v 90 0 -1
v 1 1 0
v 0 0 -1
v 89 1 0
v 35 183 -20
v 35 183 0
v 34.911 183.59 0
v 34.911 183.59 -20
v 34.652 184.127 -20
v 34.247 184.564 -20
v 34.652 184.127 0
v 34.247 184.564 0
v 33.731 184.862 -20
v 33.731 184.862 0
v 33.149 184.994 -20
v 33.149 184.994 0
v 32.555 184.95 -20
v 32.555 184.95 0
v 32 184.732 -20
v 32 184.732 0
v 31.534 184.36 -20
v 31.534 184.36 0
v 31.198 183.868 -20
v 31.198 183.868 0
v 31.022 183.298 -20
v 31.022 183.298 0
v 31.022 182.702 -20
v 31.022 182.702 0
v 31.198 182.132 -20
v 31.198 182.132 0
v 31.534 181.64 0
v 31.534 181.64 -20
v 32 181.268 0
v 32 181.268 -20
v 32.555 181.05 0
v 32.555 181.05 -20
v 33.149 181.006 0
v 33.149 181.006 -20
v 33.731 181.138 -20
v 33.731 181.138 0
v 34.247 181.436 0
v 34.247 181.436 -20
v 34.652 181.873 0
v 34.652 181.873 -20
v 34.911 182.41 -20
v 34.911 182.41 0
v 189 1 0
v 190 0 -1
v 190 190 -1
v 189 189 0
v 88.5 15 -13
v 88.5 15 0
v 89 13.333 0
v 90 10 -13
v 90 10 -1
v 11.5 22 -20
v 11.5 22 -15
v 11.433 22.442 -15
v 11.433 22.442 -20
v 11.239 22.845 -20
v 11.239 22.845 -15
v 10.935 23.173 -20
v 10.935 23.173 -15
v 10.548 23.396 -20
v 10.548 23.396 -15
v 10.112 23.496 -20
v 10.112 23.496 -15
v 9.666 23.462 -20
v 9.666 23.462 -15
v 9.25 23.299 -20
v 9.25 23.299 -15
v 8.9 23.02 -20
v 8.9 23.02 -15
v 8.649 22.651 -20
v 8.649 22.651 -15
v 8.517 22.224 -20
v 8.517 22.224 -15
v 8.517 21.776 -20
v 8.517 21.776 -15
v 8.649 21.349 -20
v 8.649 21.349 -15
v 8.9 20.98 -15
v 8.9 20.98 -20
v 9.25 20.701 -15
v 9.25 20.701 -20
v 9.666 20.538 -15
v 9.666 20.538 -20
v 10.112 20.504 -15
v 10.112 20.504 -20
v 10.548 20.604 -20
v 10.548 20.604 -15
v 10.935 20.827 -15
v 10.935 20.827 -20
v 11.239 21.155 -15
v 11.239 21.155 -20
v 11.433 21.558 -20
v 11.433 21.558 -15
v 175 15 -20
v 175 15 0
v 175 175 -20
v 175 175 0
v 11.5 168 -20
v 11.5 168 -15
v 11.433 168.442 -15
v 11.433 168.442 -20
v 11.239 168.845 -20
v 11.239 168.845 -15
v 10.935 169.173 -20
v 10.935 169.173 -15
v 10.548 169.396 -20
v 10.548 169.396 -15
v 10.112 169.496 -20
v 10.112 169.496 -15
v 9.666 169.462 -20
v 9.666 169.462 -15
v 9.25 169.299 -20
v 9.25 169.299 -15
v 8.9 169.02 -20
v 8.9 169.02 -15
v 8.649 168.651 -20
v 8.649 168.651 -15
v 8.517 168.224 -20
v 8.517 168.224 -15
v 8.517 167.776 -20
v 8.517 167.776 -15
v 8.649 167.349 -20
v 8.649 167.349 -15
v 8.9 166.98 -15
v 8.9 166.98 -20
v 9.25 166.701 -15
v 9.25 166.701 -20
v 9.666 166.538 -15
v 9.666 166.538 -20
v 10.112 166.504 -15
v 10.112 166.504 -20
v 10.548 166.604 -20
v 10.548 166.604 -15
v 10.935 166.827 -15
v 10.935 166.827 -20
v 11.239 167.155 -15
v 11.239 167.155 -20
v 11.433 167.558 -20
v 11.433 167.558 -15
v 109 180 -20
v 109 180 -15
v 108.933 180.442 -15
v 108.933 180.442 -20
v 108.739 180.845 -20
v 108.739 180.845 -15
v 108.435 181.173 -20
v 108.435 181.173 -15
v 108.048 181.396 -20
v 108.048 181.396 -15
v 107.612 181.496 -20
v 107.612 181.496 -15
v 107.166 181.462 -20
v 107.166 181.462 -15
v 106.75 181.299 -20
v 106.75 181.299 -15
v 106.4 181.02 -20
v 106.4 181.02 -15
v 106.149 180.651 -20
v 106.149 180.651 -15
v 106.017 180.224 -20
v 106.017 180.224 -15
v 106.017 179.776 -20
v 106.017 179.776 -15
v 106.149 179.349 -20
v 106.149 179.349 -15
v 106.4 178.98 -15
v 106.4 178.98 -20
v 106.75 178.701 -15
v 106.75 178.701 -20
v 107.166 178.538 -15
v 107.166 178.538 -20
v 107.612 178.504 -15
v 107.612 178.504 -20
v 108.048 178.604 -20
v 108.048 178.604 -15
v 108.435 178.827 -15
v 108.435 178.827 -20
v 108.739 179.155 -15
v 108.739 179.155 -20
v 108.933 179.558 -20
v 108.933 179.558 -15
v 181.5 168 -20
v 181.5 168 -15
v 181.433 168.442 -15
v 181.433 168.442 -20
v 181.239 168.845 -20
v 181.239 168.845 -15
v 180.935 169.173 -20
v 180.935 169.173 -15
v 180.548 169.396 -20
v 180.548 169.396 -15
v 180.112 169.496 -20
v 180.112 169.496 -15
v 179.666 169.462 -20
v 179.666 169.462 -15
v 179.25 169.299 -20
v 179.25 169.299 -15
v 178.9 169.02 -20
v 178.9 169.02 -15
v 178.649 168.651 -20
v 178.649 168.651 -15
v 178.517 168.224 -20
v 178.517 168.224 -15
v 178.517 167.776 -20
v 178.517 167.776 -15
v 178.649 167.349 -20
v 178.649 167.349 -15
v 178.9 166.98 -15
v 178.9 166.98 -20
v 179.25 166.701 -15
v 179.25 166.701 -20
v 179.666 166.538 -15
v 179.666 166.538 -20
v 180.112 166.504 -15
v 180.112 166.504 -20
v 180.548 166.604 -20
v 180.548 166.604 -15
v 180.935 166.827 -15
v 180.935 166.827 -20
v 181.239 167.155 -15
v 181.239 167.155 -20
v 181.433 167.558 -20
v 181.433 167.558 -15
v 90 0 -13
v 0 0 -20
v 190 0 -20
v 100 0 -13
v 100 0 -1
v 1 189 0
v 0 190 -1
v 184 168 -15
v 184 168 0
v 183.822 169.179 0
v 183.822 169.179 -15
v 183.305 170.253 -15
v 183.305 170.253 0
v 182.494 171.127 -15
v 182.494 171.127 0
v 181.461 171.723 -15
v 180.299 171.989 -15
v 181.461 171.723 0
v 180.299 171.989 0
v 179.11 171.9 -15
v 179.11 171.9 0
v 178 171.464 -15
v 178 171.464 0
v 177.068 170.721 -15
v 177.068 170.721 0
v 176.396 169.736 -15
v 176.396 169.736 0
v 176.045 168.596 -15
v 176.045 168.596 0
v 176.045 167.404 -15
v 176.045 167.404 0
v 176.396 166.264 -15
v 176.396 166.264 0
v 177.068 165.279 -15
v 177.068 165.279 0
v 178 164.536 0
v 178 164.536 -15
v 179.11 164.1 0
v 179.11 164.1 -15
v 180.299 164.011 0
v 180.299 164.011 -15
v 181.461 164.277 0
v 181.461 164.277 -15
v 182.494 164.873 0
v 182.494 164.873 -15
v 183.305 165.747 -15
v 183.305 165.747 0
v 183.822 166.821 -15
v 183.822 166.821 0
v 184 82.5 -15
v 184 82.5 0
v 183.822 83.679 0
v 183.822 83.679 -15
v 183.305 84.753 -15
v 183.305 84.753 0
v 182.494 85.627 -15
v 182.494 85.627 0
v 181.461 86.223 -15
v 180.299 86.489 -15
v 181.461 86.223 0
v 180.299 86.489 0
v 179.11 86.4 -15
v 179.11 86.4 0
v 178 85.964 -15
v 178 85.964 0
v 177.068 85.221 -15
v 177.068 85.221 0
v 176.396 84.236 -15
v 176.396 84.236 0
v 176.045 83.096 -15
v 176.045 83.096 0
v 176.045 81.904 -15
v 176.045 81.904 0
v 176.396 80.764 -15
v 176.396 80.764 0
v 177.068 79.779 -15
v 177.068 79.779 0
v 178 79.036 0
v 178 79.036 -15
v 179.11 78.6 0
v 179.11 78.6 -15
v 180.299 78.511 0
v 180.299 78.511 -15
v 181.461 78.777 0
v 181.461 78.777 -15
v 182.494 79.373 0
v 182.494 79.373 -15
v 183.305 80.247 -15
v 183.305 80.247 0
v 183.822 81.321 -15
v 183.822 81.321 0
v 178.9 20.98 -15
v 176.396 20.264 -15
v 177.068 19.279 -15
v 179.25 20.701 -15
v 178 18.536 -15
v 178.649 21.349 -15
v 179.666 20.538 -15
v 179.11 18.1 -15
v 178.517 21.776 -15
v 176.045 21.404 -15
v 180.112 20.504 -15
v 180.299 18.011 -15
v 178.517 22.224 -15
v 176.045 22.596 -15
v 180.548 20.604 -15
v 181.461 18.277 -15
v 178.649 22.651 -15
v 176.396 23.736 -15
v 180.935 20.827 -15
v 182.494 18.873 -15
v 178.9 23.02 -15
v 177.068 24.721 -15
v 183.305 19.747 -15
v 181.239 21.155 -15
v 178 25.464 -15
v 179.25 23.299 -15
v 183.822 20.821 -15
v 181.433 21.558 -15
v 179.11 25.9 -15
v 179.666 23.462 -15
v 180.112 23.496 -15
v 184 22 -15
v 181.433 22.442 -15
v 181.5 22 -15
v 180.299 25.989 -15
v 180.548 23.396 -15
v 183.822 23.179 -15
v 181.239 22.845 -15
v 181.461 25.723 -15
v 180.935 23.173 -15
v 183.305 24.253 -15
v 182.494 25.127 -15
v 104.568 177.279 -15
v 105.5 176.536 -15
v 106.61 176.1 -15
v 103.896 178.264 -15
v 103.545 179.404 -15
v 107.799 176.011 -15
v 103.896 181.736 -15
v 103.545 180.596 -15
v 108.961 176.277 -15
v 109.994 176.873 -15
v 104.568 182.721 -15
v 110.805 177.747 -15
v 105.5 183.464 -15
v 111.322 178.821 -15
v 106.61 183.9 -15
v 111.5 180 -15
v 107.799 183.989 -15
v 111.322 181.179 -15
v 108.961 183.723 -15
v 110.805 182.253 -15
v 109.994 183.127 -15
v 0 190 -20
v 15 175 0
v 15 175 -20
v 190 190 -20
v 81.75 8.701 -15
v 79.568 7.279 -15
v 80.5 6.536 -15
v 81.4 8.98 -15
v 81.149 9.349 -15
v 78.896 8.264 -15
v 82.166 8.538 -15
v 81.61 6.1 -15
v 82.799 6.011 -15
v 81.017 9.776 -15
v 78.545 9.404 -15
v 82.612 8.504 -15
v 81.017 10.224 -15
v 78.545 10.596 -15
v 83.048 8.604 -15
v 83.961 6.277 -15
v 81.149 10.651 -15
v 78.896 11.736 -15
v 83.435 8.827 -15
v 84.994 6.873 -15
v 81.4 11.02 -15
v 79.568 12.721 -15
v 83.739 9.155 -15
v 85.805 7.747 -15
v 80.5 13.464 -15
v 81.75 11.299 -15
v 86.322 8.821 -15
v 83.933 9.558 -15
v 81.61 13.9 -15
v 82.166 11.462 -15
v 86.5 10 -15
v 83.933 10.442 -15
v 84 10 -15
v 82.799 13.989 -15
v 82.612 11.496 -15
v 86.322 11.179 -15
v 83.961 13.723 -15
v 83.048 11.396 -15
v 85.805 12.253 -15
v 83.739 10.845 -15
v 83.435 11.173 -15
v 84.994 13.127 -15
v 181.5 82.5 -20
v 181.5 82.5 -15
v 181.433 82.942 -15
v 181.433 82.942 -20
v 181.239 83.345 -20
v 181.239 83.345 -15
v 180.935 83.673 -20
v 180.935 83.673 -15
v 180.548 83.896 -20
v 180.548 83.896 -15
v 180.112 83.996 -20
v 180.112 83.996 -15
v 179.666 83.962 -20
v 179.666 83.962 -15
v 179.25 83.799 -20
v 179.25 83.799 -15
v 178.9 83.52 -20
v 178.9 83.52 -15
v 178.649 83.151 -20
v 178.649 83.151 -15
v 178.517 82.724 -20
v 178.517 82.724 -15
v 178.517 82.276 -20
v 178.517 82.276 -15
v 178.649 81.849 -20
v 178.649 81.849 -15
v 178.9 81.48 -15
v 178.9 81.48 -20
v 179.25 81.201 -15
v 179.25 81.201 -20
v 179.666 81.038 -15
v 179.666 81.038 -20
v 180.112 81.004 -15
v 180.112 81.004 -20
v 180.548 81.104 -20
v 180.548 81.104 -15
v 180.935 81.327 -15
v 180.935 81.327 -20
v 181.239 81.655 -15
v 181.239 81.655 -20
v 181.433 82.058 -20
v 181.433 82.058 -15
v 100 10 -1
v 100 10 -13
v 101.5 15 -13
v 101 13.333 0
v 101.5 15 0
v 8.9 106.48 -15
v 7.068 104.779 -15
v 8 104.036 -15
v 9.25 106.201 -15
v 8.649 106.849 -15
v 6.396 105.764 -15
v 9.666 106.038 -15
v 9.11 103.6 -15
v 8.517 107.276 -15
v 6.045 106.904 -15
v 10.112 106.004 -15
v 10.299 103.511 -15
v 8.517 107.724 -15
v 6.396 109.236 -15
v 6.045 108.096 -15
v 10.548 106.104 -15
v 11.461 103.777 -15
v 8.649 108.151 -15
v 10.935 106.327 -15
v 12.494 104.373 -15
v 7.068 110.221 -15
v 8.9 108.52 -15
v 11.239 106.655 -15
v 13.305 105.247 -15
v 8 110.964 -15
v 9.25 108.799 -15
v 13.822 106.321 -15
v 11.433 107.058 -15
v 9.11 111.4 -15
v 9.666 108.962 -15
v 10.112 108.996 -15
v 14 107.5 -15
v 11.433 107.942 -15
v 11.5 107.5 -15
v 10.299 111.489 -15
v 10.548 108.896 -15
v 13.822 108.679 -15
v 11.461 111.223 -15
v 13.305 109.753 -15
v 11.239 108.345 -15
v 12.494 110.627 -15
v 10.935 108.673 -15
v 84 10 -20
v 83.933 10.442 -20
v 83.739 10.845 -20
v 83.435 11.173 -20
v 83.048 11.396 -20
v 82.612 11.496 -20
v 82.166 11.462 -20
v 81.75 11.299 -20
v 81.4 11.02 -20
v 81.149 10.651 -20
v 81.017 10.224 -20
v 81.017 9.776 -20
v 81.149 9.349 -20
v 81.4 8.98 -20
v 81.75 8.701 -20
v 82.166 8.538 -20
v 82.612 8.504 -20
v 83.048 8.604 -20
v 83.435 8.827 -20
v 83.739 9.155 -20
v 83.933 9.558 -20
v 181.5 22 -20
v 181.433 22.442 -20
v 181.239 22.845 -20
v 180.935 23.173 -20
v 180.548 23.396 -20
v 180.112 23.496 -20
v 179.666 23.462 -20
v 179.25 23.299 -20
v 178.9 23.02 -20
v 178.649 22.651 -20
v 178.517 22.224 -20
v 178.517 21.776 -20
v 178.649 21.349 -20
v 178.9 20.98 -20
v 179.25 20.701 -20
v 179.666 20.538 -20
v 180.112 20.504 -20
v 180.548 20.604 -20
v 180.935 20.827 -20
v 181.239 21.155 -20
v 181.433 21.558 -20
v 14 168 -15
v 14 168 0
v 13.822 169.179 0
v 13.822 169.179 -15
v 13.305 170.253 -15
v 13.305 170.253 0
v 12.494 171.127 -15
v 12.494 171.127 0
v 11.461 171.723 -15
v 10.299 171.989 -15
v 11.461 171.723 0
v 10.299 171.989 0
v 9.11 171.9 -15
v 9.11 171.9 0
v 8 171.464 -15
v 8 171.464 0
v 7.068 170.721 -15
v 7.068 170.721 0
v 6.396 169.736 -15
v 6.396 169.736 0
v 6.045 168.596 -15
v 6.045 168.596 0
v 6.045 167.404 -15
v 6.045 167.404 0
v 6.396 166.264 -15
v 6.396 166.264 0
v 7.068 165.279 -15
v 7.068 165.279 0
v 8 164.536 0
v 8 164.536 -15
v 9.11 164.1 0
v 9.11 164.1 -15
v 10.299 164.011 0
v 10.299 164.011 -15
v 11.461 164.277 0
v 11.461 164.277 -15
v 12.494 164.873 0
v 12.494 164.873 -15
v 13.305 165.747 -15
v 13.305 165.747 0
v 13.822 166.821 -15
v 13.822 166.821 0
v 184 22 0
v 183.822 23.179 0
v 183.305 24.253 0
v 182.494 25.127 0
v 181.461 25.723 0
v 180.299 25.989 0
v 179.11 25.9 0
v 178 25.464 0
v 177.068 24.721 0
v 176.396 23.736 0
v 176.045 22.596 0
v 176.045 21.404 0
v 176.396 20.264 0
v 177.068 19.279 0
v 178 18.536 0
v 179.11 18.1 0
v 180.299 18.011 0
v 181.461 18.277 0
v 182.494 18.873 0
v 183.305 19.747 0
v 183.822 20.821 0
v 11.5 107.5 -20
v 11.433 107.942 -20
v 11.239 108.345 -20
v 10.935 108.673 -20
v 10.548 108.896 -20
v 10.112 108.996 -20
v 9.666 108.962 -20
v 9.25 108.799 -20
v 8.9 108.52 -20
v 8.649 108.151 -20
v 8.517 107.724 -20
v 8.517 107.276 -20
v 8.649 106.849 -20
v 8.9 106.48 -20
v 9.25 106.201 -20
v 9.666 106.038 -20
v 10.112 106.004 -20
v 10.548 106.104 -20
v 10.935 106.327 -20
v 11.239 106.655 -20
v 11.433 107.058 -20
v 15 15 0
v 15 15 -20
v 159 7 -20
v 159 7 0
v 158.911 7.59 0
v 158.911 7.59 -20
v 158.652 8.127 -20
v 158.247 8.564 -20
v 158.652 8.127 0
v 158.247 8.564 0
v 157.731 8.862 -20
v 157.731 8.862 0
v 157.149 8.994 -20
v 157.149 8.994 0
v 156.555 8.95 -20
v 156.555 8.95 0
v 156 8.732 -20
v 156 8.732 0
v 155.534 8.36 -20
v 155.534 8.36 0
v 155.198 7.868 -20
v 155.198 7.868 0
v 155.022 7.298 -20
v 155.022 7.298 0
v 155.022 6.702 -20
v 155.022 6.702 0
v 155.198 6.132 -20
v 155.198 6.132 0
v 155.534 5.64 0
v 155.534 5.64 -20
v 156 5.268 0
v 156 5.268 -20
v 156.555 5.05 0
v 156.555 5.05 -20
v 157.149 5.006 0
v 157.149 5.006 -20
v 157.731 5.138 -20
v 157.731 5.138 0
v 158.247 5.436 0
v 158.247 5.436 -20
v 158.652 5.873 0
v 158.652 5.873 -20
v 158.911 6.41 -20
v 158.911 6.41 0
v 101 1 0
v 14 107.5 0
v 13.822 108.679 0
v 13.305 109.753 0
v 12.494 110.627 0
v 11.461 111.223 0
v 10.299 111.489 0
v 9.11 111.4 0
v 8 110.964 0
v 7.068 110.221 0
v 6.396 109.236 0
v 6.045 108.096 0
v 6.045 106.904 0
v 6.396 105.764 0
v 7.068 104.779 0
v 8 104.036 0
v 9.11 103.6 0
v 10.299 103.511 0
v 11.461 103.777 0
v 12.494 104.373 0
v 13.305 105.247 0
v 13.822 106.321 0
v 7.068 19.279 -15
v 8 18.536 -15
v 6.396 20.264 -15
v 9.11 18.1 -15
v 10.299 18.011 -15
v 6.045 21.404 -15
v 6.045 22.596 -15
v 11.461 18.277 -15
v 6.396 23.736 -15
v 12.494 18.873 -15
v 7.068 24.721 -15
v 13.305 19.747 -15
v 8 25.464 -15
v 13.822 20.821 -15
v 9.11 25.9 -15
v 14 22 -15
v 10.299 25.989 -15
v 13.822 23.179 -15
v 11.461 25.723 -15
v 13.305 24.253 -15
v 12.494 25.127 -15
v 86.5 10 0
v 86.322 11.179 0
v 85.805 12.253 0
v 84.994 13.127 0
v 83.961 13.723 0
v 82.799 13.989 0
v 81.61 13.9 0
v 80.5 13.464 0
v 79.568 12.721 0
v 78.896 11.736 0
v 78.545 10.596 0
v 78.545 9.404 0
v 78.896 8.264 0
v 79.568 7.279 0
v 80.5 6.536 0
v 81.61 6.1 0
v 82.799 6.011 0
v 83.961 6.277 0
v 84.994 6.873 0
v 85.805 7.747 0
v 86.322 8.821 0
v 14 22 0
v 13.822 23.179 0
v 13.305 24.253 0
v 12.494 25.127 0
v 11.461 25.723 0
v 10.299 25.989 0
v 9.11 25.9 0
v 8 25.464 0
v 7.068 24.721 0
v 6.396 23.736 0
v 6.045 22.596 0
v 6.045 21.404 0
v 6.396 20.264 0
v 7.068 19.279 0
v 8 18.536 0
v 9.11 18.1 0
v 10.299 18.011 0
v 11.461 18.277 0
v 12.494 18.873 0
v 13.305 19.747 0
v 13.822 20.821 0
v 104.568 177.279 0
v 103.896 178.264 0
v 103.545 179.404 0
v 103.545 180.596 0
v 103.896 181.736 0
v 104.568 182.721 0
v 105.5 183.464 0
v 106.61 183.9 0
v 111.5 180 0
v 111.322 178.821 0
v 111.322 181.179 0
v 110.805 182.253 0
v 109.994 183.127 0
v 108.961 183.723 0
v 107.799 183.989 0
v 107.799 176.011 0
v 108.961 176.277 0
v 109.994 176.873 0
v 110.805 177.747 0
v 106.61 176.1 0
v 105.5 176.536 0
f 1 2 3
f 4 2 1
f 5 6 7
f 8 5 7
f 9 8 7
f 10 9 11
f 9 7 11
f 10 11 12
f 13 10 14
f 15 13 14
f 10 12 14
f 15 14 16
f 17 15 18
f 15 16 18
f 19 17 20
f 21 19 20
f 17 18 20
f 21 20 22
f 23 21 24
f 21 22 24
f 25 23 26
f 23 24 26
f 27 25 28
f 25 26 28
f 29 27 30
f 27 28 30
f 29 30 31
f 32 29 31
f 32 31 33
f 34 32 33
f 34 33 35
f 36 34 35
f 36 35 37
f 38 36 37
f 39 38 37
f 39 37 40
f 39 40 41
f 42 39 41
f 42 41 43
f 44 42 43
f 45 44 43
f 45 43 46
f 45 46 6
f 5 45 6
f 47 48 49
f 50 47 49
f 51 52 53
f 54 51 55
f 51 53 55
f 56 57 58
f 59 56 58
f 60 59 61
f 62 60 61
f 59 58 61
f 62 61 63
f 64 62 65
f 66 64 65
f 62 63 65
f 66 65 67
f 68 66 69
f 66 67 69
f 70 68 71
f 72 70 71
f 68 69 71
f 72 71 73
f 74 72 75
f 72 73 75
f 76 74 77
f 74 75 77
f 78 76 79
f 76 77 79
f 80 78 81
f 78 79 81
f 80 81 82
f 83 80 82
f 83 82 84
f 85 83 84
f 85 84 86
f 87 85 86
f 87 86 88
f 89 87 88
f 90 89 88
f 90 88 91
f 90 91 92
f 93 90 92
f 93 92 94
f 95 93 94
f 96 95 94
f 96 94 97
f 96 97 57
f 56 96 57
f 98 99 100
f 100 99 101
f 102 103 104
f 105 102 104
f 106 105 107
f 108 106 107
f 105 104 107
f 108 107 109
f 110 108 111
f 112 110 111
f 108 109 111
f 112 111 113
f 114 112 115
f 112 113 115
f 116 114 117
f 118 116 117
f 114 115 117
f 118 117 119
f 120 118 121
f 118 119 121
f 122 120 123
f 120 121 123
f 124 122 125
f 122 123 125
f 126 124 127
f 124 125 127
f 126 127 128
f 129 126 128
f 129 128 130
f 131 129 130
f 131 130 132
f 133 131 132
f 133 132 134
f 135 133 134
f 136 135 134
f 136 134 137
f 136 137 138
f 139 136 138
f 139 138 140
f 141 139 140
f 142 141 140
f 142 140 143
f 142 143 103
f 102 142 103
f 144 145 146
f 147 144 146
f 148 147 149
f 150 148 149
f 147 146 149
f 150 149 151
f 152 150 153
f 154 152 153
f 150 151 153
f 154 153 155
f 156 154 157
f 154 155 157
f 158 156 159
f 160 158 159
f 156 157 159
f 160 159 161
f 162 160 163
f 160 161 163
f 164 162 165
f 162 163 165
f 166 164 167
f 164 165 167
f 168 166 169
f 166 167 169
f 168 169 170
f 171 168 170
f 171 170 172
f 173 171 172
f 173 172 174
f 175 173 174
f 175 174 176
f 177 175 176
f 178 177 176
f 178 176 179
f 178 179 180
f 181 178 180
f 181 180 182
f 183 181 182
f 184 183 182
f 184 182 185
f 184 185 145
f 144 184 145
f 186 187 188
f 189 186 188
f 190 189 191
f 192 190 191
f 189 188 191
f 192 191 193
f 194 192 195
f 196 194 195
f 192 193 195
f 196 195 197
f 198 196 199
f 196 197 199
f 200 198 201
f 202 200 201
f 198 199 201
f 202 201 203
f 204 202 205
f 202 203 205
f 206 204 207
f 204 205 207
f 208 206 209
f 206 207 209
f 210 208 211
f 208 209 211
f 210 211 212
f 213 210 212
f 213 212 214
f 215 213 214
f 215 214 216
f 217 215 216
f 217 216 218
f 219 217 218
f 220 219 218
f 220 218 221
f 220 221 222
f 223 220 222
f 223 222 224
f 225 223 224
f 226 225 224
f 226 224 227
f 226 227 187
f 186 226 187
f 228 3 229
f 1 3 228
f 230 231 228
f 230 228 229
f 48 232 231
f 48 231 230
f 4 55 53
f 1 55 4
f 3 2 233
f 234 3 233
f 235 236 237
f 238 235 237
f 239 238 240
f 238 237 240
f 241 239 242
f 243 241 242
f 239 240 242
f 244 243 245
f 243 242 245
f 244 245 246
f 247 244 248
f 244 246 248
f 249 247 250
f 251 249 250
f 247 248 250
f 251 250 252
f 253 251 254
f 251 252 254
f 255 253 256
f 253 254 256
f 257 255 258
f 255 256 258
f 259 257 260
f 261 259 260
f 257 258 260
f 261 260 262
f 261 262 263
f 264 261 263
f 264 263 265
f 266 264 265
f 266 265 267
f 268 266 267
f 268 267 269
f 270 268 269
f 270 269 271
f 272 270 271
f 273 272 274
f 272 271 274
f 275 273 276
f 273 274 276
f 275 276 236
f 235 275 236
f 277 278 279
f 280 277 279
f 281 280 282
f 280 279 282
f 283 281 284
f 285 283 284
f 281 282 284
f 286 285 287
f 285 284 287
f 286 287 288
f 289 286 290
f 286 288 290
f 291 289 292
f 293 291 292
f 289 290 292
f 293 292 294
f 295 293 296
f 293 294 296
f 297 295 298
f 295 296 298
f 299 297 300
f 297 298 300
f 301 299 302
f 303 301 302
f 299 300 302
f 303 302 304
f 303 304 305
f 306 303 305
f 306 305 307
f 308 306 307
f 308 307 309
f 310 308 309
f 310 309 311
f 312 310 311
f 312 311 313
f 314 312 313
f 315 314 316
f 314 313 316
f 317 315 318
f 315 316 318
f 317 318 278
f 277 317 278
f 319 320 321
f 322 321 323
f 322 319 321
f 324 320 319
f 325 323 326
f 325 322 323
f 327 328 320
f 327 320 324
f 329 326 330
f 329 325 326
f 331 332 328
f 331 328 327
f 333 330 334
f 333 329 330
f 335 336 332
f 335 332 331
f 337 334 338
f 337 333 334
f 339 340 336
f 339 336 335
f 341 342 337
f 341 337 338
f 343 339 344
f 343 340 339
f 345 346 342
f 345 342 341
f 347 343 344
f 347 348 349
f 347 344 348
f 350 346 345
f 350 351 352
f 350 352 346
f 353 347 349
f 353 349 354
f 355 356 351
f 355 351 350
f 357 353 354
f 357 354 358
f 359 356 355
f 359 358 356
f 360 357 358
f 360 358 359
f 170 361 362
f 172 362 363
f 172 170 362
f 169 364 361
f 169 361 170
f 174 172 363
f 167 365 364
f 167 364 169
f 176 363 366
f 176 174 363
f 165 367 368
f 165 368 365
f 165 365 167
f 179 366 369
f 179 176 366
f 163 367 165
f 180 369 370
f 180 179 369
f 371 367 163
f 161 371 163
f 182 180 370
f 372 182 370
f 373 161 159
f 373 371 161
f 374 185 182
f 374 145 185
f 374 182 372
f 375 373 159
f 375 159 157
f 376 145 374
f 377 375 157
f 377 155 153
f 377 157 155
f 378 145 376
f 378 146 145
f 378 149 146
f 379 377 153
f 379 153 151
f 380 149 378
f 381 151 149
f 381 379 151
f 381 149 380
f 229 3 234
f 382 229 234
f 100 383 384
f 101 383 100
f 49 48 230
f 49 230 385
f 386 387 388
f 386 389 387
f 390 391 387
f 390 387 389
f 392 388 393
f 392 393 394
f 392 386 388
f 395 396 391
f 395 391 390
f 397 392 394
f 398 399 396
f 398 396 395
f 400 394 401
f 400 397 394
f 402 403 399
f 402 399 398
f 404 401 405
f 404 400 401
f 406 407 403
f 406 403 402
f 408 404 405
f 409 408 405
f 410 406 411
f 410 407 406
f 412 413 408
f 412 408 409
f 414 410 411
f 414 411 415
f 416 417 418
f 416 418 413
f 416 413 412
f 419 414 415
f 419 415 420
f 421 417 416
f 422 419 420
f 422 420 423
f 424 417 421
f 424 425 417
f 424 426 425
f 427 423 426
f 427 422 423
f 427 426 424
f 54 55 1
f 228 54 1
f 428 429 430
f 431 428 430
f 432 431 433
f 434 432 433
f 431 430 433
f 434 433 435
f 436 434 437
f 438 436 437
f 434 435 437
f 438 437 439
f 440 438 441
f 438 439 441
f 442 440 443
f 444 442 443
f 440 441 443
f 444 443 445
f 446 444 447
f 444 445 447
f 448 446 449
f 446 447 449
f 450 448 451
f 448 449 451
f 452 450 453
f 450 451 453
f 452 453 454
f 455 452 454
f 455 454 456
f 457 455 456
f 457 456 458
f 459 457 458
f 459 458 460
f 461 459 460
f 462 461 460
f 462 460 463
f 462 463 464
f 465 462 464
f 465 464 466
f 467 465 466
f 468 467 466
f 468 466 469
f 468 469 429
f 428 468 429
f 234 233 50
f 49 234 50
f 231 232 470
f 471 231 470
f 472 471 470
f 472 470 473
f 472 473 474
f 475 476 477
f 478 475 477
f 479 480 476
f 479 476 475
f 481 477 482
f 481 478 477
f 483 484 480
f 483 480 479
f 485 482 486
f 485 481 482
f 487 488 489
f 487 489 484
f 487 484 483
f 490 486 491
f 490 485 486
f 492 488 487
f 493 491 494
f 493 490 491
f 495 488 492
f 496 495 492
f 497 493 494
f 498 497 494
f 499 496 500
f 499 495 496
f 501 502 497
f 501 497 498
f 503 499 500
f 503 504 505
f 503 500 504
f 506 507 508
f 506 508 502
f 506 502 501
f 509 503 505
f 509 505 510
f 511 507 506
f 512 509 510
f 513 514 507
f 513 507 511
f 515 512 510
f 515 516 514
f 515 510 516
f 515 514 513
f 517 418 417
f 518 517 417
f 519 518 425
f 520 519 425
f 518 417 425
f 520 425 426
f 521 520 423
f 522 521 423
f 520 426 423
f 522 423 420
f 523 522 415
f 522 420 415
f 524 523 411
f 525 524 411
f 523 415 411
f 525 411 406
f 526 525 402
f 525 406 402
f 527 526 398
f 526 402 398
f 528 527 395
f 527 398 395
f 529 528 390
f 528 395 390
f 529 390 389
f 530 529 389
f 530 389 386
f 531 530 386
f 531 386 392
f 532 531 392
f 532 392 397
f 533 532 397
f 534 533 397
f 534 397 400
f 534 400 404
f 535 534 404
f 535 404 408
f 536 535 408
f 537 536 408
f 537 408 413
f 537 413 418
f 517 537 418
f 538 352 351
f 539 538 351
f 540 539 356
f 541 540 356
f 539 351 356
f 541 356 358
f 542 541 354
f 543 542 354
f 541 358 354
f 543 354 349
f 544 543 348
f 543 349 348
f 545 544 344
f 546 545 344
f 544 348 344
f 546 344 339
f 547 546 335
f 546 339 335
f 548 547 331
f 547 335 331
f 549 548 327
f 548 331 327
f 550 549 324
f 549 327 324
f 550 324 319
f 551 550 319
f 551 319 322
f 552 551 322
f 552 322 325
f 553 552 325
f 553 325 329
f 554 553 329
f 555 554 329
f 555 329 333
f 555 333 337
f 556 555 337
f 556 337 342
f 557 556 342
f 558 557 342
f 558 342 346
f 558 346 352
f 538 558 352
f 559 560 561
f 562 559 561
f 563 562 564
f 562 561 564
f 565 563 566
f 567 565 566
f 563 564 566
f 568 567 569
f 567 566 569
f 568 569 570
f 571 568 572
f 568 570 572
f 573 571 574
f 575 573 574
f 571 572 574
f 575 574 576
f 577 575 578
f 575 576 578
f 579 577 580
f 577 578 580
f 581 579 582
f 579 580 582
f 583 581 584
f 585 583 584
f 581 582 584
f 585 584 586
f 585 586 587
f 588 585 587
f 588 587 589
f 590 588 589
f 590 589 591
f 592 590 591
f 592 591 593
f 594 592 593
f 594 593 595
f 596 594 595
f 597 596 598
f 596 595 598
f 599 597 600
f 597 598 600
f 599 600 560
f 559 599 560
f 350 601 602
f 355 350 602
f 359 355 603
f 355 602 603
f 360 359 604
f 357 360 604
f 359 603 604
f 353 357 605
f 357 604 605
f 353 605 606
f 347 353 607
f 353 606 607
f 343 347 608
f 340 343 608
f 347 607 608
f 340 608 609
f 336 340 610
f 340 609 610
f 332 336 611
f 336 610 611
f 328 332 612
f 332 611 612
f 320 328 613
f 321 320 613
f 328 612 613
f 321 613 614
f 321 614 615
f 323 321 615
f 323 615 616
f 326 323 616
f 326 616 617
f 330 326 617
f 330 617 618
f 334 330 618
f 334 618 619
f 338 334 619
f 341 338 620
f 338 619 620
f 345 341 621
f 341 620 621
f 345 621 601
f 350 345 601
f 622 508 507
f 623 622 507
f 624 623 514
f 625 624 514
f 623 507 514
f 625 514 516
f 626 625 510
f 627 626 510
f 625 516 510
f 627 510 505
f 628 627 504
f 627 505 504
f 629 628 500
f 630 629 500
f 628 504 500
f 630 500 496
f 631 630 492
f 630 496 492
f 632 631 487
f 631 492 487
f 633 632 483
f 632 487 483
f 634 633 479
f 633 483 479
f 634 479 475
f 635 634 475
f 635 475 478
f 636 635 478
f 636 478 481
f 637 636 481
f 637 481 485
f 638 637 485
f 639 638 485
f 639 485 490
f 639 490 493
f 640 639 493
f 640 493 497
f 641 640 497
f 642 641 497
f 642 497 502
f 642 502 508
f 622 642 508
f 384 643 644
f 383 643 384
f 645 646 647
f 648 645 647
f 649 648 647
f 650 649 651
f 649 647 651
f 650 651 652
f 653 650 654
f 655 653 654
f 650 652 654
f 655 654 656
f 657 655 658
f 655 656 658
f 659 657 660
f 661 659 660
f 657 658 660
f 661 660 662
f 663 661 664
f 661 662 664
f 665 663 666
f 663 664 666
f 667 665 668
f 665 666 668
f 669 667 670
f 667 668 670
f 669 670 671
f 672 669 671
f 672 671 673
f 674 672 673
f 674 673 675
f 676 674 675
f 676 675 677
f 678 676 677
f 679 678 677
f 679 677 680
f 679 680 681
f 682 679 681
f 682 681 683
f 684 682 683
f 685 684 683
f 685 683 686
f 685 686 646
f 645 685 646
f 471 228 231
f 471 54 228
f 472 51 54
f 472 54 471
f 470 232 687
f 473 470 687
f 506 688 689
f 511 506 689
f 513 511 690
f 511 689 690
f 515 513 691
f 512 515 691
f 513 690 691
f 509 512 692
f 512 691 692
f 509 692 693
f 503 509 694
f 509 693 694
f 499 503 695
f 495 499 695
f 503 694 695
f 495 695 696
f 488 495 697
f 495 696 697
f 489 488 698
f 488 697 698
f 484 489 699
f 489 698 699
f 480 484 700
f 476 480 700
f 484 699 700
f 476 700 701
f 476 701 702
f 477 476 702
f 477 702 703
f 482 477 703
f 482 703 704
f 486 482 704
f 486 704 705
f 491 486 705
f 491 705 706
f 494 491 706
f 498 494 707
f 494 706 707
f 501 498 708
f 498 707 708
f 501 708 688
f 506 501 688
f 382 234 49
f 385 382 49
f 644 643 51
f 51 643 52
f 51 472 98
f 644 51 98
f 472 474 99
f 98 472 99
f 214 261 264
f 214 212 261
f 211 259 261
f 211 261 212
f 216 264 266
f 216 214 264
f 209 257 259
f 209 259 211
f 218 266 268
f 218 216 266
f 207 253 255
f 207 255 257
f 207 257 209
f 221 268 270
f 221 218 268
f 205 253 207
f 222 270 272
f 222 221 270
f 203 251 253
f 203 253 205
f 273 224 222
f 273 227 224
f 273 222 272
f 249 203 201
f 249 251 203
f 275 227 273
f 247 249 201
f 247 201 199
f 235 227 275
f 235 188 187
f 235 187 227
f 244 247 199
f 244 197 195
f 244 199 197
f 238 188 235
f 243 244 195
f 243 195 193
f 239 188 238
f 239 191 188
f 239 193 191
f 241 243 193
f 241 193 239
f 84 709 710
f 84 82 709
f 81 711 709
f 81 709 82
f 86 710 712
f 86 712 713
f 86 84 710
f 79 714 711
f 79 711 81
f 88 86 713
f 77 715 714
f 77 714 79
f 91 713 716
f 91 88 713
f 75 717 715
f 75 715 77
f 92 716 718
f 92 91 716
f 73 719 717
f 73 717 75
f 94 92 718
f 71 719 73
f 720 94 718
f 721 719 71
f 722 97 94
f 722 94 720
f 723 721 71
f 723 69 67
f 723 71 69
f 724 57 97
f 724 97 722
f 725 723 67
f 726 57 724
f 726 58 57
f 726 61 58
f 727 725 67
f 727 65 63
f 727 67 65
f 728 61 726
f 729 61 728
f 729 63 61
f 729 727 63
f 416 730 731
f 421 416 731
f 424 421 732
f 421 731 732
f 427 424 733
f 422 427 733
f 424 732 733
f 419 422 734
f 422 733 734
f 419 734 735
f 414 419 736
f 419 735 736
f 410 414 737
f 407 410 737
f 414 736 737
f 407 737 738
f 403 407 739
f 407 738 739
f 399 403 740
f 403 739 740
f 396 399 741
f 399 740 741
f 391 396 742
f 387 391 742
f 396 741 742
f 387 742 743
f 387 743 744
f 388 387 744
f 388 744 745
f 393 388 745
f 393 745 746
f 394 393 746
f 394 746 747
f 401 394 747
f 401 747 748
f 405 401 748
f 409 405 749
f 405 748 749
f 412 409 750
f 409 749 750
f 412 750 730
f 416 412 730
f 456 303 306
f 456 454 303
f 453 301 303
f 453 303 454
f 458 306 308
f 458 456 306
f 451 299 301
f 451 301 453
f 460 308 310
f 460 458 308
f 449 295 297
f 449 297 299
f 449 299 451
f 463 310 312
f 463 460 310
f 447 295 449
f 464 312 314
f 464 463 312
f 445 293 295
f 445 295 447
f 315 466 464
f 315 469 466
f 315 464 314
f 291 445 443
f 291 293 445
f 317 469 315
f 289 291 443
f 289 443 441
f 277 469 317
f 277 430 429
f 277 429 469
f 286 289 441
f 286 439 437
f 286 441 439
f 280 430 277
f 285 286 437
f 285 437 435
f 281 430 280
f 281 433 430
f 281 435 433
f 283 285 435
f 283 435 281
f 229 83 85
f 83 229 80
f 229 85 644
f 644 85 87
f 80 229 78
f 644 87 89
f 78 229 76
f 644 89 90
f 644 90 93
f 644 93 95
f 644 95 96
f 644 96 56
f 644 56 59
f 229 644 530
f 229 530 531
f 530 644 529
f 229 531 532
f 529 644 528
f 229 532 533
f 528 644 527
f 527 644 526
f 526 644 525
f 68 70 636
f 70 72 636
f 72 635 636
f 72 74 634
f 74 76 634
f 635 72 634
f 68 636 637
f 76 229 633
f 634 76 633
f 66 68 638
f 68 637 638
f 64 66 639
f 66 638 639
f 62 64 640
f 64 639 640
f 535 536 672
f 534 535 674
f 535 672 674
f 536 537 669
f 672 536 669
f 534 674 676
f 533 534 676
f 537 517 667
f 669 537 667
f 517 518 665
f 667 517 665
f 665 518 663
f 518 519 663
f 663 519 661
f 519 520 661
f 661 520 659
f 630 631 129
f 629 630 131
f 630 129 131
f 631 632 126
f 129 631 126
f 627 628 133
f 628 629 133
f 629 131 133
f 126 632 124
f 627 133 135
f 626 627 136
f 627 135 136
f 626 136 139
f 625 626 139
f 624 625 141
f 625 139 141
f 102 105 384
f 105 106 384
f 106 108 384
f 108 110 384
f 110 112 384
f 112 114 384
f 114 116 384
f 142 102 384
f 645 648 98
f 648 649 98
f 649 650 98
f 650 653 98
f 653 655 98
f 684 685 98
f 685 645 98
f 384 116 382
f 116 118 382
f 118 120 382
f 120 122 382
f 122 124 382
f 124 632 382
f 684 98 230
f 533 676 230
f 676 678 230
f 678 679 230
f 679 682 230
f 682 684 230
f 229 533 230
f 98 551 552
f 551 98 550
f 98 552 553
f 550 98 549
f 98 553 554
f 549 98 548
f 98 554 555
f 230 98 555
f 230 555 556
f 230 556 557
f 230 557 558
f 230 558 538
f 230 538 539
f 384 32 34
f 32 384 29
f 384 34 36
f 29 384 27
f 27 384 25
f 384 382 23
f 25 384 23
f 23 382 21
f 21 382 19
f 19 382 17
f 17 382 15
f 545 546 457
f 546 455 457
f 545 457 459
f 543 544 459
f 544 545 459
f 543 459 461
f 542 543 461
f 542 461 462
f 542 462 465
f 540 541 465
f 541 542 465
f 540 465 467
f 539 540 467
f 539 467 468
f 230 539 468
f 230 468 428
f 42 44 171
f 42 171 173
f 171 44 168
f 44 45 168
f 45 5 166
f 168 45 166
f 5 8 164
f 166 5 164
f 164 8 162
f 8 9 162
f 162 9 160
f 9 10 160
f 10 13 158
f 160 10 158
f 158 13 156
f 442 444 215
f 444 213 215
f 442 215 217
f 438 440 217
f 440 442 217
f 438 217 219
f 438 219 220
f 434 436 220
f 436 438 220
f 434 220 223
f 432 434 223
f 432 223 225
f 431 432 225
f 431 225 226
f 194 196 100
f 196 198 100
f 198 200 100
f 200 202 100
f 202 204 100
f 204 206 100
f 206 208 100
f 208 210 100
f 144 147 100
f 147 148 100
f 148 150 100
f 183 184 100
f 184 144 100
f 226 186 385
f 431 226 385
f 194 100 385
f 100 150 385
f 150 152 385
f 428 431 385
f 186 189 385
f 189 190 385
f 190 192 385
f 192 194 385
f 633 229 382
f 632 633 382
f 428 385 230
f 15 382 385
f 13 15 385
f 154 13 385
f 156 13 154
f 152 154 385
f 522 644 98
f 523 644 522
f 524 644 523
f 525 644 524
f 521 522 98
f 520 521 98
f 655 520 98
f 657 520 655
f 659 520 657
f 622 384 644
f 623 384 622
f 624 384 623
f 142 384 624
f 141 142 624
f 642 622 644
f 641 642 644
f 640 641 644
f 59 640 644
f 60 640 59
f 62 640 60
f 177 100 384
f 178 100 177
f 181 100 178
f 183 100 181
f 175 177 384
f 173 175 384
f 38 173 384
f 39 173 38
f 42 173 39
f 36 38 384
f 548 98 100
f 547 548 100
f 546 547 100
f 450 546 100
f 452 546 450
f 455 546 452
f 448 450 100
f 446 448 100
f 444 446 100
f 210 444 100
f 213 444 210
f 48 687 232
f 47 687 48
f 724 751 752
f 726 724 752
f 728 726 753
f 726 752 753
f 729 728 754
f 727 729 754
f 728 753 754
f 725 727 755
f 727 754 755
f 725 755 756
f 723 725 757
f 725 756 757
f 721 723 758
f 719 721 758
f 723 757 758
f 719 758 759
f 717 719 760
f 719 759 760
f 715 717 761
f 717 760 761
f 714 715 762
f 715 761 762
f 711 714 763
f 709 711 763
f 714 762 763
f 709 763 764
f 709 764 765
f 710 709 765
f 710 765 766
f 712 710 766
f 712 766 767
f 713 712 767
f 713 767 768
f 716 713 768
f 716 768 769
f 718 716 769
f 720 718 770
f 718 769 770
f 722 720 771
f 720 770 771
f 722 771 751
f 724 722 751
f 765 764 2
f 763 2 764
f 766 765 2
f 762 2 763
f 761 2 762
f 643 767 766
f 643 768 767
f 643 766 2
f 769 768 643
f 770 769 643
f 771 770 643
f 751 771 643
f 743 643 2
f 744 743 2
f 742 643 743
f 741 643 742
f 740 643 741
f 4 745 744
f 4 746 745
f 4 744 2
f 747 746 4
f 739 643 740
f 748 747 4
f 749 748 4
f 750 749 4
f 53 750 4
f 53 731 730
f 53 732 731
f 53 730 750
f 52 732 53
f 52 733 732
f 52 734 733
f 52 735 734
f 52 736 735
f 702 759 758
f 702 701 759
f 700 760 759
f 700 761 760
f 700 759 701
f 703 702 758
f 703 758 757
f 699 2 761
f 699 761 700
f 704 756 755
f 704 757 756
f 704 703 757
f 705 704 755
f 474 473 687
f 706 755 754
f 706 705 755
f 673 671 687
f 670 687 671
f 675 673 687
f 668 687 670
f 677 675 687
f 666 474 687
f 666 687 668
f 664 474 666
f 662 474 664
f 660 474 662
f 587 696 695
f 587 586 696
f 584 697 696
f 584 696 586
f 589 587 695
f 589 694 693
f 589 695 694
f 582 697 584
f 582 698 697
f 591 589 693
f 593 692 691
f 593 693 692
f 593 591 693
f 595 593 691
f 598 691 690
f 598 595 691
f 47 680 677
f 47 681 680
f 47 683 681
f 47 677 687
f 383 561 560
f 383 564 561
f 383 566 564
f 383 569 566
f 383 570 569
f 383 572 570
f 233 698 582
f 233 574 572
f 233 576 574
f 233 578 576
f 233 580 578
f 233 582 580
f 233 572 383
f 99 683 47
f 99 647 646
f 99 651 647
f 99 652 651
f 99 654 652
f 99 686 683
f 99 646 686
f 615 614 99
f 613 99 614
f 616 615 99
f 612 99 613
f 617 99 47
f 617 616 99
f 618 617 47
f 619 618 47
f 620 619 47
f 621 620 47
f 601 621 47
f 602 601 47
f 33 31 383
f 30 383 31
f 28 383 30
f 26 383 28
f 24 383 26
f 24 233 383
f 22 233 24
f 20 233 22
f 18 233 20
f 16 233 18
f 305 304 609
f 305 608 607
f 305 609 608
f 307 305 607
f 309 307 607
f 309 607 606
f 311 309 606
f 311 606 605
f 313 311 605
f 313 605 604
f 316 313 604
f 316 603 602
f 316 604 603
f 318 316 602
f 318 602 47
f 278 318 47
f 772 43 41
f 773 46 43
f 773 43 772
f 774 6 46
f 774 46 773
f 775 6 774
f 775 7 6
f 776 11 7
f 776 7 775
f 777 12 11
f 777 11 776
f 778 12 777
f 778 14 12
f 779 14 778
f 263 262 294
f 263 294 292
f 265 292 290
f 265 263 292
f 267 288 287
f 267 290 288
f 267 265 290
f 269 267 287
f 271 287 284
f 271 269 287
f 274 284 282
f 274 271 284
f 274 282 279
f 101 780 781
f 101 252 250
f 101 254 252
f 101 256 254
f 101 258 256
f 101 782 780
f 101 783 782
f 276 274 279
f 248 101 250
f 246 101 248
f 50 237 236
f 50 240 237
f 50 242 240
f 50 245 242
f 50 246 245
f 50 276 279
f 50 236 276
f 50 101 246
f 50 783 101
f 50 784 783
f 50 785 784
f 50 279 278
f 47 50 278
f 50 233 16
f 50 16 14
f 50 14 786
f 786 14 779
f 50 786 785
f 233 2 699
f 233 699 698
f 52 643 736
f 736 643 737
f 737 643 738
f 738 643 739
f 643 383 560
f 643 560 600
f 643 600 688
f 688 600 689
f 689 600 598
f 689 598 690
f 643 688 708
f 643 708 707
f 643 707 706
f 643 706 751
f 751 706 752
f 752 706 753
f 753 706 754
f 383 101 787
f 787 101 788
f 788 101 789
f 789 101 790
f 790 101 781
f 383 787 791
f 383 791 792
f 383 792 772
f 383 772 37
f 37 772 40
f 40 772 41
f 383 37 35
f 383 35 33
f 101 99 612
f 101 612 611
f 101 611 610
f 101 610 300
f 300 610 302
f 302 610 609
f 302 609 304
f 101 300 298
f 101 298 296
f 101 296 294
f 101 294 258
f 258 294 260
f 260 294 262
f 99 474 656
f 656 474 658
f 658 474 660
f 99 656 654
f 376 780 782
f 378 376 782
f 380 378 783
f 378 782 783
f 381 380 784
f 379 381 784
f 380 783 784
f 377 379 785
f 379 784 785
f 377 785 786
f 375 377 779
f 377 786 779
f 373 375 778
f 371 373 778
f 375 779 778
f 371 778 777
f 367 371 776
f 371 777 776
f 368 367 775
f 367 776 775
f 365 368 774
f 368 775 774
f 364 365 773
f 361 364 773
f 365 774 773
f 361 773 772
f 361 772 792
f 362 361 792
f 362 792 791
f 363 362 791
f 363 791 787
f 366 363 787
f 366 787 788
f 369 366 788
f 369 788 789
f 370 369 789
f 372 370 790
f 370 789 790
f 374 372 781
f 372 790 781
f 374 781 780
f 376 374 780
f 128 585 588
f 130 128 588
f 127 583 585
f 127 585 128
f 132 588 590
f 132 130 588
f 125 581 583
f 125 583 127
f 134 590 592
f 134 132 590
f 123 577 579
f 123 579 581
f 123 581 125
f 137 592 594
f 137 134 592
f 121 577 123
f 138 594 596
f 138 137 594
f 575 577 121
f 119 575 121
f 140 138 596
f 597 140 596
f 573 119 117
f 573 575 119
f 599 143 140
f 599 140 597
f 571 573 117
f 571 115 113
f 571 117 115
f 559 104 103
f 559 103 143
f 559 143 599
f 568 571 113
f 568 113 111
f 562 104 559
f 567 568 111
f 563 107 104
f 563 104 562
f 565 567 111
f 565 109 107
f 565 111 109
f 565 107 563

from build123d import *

# Parameters (mm, degrees)
SKETCH_W        = 190
SKETCH_H        = 190
SKETCH_W_2      = 160
SKETCH_H_2      = 160
PAD_DEPTH       = 20
SKETCH001_R     = 1.5
SKETCH001_R_2   = 2
POCKET_DEPTH    = 20.001
SKETCH002_R     = 4
POCKET001_DEPTH = 15
POCKET002_DEPTH = 13
CHAMFER_SIZE    = 1


with BuildPart() as part:
    # Sketch → Pad (new body)
    with BuildSketch(Plane.XY):
        with Locations((95, 95)):
            Rectangle(SKETCH_W, SKETCH_H)
        with Locations((95, 95)):
            Rectangle(SKETCH_W_2, SKETCH_H_2, mode=Mode.SUBTRACT)
    extrude(amount=-PAD_DEPTH)

    # Sketch001 → Pocket (cut, through all)
    with BuildSketch(Plane.XY):
        with Locations((10, 22)):
            Circle(SKETCH001_R)
        with Locations((10, 107.5)):
            Circle(SKETCH001_R)
        with Locations((10, 168)):
            Circle(SKETCH001_R)
        with Locations((107.5, 180)):
            Circle(SKETCH001_R)
        with Locations((180, 168)):
            Circle(SKETCH001_R)
        with Locations((180, 82.5)):
            Circle(SKETCH001_R)
        with Locations((180, 22)):
            Circle(SKETCH001_R)
        with Locations((82.5, 10)):
            Circle(SKETCH001_R)
        with Locations((33, 183)):
            Circle(SKETCH001_R_2)
        with Locations((157, 7)):
            Circle(SKETCH001_R_2)
    extrude(amount=-POCKET_DEPTH, mode=Mode.SUBTRACT)

    # Sketch002 → Pocket001 (cut)
    with BuildSketch(Plane.XY):
        with Locations((107.5, 180)):
            Circle(SKETCH002_R)
        with Locations((180, 168)):
            Circle(SKETCH002_R)
        with Locations((10, 168)):
            Circle(SKETCH002_R)
        with Locations((10, 107.5)):
            Circle(SKETCH002_R)
        with Locations((10, 22)):
            Circle(SKETCH002_R)
        with Locations((82.5, 10)):
            Circle(SKETCH002_R)
        with Locations((180, 22)):
            Circle(SKETCH002_R)
        with Locations((180, 82.5)):
            Circle(SKETCH002_R)
    extrude(amount=-POCKET001_DEPTH, mode=Mode.SUBTRACT)

    # Sketch003 → Pocket002 (cut)
    with BuildSketch(Plane.XY):
        Polygon((90, 0), (100, 0), (100, 10), (101.5, 15), (88.5, 15), (90, 10), align=None)
    extrude(amount=-POCKET002_DEPTH, mode=Mode.SUBTRACT)

    # Chamfer
    chamfer_edges = [part.edges().sort_by_distance(p)[0] for p in [
        (0, 95, 0),
        (45, 0, 0),
        (145, 0, 0),
        (190, 95, 0),
        (95, 190, 0),
        (100, 5, 0),
        (90, 5, 0),
    ]]
    chamfer(chamfer_edges, length=CHAMFER_SIZE)


solid = part.part
